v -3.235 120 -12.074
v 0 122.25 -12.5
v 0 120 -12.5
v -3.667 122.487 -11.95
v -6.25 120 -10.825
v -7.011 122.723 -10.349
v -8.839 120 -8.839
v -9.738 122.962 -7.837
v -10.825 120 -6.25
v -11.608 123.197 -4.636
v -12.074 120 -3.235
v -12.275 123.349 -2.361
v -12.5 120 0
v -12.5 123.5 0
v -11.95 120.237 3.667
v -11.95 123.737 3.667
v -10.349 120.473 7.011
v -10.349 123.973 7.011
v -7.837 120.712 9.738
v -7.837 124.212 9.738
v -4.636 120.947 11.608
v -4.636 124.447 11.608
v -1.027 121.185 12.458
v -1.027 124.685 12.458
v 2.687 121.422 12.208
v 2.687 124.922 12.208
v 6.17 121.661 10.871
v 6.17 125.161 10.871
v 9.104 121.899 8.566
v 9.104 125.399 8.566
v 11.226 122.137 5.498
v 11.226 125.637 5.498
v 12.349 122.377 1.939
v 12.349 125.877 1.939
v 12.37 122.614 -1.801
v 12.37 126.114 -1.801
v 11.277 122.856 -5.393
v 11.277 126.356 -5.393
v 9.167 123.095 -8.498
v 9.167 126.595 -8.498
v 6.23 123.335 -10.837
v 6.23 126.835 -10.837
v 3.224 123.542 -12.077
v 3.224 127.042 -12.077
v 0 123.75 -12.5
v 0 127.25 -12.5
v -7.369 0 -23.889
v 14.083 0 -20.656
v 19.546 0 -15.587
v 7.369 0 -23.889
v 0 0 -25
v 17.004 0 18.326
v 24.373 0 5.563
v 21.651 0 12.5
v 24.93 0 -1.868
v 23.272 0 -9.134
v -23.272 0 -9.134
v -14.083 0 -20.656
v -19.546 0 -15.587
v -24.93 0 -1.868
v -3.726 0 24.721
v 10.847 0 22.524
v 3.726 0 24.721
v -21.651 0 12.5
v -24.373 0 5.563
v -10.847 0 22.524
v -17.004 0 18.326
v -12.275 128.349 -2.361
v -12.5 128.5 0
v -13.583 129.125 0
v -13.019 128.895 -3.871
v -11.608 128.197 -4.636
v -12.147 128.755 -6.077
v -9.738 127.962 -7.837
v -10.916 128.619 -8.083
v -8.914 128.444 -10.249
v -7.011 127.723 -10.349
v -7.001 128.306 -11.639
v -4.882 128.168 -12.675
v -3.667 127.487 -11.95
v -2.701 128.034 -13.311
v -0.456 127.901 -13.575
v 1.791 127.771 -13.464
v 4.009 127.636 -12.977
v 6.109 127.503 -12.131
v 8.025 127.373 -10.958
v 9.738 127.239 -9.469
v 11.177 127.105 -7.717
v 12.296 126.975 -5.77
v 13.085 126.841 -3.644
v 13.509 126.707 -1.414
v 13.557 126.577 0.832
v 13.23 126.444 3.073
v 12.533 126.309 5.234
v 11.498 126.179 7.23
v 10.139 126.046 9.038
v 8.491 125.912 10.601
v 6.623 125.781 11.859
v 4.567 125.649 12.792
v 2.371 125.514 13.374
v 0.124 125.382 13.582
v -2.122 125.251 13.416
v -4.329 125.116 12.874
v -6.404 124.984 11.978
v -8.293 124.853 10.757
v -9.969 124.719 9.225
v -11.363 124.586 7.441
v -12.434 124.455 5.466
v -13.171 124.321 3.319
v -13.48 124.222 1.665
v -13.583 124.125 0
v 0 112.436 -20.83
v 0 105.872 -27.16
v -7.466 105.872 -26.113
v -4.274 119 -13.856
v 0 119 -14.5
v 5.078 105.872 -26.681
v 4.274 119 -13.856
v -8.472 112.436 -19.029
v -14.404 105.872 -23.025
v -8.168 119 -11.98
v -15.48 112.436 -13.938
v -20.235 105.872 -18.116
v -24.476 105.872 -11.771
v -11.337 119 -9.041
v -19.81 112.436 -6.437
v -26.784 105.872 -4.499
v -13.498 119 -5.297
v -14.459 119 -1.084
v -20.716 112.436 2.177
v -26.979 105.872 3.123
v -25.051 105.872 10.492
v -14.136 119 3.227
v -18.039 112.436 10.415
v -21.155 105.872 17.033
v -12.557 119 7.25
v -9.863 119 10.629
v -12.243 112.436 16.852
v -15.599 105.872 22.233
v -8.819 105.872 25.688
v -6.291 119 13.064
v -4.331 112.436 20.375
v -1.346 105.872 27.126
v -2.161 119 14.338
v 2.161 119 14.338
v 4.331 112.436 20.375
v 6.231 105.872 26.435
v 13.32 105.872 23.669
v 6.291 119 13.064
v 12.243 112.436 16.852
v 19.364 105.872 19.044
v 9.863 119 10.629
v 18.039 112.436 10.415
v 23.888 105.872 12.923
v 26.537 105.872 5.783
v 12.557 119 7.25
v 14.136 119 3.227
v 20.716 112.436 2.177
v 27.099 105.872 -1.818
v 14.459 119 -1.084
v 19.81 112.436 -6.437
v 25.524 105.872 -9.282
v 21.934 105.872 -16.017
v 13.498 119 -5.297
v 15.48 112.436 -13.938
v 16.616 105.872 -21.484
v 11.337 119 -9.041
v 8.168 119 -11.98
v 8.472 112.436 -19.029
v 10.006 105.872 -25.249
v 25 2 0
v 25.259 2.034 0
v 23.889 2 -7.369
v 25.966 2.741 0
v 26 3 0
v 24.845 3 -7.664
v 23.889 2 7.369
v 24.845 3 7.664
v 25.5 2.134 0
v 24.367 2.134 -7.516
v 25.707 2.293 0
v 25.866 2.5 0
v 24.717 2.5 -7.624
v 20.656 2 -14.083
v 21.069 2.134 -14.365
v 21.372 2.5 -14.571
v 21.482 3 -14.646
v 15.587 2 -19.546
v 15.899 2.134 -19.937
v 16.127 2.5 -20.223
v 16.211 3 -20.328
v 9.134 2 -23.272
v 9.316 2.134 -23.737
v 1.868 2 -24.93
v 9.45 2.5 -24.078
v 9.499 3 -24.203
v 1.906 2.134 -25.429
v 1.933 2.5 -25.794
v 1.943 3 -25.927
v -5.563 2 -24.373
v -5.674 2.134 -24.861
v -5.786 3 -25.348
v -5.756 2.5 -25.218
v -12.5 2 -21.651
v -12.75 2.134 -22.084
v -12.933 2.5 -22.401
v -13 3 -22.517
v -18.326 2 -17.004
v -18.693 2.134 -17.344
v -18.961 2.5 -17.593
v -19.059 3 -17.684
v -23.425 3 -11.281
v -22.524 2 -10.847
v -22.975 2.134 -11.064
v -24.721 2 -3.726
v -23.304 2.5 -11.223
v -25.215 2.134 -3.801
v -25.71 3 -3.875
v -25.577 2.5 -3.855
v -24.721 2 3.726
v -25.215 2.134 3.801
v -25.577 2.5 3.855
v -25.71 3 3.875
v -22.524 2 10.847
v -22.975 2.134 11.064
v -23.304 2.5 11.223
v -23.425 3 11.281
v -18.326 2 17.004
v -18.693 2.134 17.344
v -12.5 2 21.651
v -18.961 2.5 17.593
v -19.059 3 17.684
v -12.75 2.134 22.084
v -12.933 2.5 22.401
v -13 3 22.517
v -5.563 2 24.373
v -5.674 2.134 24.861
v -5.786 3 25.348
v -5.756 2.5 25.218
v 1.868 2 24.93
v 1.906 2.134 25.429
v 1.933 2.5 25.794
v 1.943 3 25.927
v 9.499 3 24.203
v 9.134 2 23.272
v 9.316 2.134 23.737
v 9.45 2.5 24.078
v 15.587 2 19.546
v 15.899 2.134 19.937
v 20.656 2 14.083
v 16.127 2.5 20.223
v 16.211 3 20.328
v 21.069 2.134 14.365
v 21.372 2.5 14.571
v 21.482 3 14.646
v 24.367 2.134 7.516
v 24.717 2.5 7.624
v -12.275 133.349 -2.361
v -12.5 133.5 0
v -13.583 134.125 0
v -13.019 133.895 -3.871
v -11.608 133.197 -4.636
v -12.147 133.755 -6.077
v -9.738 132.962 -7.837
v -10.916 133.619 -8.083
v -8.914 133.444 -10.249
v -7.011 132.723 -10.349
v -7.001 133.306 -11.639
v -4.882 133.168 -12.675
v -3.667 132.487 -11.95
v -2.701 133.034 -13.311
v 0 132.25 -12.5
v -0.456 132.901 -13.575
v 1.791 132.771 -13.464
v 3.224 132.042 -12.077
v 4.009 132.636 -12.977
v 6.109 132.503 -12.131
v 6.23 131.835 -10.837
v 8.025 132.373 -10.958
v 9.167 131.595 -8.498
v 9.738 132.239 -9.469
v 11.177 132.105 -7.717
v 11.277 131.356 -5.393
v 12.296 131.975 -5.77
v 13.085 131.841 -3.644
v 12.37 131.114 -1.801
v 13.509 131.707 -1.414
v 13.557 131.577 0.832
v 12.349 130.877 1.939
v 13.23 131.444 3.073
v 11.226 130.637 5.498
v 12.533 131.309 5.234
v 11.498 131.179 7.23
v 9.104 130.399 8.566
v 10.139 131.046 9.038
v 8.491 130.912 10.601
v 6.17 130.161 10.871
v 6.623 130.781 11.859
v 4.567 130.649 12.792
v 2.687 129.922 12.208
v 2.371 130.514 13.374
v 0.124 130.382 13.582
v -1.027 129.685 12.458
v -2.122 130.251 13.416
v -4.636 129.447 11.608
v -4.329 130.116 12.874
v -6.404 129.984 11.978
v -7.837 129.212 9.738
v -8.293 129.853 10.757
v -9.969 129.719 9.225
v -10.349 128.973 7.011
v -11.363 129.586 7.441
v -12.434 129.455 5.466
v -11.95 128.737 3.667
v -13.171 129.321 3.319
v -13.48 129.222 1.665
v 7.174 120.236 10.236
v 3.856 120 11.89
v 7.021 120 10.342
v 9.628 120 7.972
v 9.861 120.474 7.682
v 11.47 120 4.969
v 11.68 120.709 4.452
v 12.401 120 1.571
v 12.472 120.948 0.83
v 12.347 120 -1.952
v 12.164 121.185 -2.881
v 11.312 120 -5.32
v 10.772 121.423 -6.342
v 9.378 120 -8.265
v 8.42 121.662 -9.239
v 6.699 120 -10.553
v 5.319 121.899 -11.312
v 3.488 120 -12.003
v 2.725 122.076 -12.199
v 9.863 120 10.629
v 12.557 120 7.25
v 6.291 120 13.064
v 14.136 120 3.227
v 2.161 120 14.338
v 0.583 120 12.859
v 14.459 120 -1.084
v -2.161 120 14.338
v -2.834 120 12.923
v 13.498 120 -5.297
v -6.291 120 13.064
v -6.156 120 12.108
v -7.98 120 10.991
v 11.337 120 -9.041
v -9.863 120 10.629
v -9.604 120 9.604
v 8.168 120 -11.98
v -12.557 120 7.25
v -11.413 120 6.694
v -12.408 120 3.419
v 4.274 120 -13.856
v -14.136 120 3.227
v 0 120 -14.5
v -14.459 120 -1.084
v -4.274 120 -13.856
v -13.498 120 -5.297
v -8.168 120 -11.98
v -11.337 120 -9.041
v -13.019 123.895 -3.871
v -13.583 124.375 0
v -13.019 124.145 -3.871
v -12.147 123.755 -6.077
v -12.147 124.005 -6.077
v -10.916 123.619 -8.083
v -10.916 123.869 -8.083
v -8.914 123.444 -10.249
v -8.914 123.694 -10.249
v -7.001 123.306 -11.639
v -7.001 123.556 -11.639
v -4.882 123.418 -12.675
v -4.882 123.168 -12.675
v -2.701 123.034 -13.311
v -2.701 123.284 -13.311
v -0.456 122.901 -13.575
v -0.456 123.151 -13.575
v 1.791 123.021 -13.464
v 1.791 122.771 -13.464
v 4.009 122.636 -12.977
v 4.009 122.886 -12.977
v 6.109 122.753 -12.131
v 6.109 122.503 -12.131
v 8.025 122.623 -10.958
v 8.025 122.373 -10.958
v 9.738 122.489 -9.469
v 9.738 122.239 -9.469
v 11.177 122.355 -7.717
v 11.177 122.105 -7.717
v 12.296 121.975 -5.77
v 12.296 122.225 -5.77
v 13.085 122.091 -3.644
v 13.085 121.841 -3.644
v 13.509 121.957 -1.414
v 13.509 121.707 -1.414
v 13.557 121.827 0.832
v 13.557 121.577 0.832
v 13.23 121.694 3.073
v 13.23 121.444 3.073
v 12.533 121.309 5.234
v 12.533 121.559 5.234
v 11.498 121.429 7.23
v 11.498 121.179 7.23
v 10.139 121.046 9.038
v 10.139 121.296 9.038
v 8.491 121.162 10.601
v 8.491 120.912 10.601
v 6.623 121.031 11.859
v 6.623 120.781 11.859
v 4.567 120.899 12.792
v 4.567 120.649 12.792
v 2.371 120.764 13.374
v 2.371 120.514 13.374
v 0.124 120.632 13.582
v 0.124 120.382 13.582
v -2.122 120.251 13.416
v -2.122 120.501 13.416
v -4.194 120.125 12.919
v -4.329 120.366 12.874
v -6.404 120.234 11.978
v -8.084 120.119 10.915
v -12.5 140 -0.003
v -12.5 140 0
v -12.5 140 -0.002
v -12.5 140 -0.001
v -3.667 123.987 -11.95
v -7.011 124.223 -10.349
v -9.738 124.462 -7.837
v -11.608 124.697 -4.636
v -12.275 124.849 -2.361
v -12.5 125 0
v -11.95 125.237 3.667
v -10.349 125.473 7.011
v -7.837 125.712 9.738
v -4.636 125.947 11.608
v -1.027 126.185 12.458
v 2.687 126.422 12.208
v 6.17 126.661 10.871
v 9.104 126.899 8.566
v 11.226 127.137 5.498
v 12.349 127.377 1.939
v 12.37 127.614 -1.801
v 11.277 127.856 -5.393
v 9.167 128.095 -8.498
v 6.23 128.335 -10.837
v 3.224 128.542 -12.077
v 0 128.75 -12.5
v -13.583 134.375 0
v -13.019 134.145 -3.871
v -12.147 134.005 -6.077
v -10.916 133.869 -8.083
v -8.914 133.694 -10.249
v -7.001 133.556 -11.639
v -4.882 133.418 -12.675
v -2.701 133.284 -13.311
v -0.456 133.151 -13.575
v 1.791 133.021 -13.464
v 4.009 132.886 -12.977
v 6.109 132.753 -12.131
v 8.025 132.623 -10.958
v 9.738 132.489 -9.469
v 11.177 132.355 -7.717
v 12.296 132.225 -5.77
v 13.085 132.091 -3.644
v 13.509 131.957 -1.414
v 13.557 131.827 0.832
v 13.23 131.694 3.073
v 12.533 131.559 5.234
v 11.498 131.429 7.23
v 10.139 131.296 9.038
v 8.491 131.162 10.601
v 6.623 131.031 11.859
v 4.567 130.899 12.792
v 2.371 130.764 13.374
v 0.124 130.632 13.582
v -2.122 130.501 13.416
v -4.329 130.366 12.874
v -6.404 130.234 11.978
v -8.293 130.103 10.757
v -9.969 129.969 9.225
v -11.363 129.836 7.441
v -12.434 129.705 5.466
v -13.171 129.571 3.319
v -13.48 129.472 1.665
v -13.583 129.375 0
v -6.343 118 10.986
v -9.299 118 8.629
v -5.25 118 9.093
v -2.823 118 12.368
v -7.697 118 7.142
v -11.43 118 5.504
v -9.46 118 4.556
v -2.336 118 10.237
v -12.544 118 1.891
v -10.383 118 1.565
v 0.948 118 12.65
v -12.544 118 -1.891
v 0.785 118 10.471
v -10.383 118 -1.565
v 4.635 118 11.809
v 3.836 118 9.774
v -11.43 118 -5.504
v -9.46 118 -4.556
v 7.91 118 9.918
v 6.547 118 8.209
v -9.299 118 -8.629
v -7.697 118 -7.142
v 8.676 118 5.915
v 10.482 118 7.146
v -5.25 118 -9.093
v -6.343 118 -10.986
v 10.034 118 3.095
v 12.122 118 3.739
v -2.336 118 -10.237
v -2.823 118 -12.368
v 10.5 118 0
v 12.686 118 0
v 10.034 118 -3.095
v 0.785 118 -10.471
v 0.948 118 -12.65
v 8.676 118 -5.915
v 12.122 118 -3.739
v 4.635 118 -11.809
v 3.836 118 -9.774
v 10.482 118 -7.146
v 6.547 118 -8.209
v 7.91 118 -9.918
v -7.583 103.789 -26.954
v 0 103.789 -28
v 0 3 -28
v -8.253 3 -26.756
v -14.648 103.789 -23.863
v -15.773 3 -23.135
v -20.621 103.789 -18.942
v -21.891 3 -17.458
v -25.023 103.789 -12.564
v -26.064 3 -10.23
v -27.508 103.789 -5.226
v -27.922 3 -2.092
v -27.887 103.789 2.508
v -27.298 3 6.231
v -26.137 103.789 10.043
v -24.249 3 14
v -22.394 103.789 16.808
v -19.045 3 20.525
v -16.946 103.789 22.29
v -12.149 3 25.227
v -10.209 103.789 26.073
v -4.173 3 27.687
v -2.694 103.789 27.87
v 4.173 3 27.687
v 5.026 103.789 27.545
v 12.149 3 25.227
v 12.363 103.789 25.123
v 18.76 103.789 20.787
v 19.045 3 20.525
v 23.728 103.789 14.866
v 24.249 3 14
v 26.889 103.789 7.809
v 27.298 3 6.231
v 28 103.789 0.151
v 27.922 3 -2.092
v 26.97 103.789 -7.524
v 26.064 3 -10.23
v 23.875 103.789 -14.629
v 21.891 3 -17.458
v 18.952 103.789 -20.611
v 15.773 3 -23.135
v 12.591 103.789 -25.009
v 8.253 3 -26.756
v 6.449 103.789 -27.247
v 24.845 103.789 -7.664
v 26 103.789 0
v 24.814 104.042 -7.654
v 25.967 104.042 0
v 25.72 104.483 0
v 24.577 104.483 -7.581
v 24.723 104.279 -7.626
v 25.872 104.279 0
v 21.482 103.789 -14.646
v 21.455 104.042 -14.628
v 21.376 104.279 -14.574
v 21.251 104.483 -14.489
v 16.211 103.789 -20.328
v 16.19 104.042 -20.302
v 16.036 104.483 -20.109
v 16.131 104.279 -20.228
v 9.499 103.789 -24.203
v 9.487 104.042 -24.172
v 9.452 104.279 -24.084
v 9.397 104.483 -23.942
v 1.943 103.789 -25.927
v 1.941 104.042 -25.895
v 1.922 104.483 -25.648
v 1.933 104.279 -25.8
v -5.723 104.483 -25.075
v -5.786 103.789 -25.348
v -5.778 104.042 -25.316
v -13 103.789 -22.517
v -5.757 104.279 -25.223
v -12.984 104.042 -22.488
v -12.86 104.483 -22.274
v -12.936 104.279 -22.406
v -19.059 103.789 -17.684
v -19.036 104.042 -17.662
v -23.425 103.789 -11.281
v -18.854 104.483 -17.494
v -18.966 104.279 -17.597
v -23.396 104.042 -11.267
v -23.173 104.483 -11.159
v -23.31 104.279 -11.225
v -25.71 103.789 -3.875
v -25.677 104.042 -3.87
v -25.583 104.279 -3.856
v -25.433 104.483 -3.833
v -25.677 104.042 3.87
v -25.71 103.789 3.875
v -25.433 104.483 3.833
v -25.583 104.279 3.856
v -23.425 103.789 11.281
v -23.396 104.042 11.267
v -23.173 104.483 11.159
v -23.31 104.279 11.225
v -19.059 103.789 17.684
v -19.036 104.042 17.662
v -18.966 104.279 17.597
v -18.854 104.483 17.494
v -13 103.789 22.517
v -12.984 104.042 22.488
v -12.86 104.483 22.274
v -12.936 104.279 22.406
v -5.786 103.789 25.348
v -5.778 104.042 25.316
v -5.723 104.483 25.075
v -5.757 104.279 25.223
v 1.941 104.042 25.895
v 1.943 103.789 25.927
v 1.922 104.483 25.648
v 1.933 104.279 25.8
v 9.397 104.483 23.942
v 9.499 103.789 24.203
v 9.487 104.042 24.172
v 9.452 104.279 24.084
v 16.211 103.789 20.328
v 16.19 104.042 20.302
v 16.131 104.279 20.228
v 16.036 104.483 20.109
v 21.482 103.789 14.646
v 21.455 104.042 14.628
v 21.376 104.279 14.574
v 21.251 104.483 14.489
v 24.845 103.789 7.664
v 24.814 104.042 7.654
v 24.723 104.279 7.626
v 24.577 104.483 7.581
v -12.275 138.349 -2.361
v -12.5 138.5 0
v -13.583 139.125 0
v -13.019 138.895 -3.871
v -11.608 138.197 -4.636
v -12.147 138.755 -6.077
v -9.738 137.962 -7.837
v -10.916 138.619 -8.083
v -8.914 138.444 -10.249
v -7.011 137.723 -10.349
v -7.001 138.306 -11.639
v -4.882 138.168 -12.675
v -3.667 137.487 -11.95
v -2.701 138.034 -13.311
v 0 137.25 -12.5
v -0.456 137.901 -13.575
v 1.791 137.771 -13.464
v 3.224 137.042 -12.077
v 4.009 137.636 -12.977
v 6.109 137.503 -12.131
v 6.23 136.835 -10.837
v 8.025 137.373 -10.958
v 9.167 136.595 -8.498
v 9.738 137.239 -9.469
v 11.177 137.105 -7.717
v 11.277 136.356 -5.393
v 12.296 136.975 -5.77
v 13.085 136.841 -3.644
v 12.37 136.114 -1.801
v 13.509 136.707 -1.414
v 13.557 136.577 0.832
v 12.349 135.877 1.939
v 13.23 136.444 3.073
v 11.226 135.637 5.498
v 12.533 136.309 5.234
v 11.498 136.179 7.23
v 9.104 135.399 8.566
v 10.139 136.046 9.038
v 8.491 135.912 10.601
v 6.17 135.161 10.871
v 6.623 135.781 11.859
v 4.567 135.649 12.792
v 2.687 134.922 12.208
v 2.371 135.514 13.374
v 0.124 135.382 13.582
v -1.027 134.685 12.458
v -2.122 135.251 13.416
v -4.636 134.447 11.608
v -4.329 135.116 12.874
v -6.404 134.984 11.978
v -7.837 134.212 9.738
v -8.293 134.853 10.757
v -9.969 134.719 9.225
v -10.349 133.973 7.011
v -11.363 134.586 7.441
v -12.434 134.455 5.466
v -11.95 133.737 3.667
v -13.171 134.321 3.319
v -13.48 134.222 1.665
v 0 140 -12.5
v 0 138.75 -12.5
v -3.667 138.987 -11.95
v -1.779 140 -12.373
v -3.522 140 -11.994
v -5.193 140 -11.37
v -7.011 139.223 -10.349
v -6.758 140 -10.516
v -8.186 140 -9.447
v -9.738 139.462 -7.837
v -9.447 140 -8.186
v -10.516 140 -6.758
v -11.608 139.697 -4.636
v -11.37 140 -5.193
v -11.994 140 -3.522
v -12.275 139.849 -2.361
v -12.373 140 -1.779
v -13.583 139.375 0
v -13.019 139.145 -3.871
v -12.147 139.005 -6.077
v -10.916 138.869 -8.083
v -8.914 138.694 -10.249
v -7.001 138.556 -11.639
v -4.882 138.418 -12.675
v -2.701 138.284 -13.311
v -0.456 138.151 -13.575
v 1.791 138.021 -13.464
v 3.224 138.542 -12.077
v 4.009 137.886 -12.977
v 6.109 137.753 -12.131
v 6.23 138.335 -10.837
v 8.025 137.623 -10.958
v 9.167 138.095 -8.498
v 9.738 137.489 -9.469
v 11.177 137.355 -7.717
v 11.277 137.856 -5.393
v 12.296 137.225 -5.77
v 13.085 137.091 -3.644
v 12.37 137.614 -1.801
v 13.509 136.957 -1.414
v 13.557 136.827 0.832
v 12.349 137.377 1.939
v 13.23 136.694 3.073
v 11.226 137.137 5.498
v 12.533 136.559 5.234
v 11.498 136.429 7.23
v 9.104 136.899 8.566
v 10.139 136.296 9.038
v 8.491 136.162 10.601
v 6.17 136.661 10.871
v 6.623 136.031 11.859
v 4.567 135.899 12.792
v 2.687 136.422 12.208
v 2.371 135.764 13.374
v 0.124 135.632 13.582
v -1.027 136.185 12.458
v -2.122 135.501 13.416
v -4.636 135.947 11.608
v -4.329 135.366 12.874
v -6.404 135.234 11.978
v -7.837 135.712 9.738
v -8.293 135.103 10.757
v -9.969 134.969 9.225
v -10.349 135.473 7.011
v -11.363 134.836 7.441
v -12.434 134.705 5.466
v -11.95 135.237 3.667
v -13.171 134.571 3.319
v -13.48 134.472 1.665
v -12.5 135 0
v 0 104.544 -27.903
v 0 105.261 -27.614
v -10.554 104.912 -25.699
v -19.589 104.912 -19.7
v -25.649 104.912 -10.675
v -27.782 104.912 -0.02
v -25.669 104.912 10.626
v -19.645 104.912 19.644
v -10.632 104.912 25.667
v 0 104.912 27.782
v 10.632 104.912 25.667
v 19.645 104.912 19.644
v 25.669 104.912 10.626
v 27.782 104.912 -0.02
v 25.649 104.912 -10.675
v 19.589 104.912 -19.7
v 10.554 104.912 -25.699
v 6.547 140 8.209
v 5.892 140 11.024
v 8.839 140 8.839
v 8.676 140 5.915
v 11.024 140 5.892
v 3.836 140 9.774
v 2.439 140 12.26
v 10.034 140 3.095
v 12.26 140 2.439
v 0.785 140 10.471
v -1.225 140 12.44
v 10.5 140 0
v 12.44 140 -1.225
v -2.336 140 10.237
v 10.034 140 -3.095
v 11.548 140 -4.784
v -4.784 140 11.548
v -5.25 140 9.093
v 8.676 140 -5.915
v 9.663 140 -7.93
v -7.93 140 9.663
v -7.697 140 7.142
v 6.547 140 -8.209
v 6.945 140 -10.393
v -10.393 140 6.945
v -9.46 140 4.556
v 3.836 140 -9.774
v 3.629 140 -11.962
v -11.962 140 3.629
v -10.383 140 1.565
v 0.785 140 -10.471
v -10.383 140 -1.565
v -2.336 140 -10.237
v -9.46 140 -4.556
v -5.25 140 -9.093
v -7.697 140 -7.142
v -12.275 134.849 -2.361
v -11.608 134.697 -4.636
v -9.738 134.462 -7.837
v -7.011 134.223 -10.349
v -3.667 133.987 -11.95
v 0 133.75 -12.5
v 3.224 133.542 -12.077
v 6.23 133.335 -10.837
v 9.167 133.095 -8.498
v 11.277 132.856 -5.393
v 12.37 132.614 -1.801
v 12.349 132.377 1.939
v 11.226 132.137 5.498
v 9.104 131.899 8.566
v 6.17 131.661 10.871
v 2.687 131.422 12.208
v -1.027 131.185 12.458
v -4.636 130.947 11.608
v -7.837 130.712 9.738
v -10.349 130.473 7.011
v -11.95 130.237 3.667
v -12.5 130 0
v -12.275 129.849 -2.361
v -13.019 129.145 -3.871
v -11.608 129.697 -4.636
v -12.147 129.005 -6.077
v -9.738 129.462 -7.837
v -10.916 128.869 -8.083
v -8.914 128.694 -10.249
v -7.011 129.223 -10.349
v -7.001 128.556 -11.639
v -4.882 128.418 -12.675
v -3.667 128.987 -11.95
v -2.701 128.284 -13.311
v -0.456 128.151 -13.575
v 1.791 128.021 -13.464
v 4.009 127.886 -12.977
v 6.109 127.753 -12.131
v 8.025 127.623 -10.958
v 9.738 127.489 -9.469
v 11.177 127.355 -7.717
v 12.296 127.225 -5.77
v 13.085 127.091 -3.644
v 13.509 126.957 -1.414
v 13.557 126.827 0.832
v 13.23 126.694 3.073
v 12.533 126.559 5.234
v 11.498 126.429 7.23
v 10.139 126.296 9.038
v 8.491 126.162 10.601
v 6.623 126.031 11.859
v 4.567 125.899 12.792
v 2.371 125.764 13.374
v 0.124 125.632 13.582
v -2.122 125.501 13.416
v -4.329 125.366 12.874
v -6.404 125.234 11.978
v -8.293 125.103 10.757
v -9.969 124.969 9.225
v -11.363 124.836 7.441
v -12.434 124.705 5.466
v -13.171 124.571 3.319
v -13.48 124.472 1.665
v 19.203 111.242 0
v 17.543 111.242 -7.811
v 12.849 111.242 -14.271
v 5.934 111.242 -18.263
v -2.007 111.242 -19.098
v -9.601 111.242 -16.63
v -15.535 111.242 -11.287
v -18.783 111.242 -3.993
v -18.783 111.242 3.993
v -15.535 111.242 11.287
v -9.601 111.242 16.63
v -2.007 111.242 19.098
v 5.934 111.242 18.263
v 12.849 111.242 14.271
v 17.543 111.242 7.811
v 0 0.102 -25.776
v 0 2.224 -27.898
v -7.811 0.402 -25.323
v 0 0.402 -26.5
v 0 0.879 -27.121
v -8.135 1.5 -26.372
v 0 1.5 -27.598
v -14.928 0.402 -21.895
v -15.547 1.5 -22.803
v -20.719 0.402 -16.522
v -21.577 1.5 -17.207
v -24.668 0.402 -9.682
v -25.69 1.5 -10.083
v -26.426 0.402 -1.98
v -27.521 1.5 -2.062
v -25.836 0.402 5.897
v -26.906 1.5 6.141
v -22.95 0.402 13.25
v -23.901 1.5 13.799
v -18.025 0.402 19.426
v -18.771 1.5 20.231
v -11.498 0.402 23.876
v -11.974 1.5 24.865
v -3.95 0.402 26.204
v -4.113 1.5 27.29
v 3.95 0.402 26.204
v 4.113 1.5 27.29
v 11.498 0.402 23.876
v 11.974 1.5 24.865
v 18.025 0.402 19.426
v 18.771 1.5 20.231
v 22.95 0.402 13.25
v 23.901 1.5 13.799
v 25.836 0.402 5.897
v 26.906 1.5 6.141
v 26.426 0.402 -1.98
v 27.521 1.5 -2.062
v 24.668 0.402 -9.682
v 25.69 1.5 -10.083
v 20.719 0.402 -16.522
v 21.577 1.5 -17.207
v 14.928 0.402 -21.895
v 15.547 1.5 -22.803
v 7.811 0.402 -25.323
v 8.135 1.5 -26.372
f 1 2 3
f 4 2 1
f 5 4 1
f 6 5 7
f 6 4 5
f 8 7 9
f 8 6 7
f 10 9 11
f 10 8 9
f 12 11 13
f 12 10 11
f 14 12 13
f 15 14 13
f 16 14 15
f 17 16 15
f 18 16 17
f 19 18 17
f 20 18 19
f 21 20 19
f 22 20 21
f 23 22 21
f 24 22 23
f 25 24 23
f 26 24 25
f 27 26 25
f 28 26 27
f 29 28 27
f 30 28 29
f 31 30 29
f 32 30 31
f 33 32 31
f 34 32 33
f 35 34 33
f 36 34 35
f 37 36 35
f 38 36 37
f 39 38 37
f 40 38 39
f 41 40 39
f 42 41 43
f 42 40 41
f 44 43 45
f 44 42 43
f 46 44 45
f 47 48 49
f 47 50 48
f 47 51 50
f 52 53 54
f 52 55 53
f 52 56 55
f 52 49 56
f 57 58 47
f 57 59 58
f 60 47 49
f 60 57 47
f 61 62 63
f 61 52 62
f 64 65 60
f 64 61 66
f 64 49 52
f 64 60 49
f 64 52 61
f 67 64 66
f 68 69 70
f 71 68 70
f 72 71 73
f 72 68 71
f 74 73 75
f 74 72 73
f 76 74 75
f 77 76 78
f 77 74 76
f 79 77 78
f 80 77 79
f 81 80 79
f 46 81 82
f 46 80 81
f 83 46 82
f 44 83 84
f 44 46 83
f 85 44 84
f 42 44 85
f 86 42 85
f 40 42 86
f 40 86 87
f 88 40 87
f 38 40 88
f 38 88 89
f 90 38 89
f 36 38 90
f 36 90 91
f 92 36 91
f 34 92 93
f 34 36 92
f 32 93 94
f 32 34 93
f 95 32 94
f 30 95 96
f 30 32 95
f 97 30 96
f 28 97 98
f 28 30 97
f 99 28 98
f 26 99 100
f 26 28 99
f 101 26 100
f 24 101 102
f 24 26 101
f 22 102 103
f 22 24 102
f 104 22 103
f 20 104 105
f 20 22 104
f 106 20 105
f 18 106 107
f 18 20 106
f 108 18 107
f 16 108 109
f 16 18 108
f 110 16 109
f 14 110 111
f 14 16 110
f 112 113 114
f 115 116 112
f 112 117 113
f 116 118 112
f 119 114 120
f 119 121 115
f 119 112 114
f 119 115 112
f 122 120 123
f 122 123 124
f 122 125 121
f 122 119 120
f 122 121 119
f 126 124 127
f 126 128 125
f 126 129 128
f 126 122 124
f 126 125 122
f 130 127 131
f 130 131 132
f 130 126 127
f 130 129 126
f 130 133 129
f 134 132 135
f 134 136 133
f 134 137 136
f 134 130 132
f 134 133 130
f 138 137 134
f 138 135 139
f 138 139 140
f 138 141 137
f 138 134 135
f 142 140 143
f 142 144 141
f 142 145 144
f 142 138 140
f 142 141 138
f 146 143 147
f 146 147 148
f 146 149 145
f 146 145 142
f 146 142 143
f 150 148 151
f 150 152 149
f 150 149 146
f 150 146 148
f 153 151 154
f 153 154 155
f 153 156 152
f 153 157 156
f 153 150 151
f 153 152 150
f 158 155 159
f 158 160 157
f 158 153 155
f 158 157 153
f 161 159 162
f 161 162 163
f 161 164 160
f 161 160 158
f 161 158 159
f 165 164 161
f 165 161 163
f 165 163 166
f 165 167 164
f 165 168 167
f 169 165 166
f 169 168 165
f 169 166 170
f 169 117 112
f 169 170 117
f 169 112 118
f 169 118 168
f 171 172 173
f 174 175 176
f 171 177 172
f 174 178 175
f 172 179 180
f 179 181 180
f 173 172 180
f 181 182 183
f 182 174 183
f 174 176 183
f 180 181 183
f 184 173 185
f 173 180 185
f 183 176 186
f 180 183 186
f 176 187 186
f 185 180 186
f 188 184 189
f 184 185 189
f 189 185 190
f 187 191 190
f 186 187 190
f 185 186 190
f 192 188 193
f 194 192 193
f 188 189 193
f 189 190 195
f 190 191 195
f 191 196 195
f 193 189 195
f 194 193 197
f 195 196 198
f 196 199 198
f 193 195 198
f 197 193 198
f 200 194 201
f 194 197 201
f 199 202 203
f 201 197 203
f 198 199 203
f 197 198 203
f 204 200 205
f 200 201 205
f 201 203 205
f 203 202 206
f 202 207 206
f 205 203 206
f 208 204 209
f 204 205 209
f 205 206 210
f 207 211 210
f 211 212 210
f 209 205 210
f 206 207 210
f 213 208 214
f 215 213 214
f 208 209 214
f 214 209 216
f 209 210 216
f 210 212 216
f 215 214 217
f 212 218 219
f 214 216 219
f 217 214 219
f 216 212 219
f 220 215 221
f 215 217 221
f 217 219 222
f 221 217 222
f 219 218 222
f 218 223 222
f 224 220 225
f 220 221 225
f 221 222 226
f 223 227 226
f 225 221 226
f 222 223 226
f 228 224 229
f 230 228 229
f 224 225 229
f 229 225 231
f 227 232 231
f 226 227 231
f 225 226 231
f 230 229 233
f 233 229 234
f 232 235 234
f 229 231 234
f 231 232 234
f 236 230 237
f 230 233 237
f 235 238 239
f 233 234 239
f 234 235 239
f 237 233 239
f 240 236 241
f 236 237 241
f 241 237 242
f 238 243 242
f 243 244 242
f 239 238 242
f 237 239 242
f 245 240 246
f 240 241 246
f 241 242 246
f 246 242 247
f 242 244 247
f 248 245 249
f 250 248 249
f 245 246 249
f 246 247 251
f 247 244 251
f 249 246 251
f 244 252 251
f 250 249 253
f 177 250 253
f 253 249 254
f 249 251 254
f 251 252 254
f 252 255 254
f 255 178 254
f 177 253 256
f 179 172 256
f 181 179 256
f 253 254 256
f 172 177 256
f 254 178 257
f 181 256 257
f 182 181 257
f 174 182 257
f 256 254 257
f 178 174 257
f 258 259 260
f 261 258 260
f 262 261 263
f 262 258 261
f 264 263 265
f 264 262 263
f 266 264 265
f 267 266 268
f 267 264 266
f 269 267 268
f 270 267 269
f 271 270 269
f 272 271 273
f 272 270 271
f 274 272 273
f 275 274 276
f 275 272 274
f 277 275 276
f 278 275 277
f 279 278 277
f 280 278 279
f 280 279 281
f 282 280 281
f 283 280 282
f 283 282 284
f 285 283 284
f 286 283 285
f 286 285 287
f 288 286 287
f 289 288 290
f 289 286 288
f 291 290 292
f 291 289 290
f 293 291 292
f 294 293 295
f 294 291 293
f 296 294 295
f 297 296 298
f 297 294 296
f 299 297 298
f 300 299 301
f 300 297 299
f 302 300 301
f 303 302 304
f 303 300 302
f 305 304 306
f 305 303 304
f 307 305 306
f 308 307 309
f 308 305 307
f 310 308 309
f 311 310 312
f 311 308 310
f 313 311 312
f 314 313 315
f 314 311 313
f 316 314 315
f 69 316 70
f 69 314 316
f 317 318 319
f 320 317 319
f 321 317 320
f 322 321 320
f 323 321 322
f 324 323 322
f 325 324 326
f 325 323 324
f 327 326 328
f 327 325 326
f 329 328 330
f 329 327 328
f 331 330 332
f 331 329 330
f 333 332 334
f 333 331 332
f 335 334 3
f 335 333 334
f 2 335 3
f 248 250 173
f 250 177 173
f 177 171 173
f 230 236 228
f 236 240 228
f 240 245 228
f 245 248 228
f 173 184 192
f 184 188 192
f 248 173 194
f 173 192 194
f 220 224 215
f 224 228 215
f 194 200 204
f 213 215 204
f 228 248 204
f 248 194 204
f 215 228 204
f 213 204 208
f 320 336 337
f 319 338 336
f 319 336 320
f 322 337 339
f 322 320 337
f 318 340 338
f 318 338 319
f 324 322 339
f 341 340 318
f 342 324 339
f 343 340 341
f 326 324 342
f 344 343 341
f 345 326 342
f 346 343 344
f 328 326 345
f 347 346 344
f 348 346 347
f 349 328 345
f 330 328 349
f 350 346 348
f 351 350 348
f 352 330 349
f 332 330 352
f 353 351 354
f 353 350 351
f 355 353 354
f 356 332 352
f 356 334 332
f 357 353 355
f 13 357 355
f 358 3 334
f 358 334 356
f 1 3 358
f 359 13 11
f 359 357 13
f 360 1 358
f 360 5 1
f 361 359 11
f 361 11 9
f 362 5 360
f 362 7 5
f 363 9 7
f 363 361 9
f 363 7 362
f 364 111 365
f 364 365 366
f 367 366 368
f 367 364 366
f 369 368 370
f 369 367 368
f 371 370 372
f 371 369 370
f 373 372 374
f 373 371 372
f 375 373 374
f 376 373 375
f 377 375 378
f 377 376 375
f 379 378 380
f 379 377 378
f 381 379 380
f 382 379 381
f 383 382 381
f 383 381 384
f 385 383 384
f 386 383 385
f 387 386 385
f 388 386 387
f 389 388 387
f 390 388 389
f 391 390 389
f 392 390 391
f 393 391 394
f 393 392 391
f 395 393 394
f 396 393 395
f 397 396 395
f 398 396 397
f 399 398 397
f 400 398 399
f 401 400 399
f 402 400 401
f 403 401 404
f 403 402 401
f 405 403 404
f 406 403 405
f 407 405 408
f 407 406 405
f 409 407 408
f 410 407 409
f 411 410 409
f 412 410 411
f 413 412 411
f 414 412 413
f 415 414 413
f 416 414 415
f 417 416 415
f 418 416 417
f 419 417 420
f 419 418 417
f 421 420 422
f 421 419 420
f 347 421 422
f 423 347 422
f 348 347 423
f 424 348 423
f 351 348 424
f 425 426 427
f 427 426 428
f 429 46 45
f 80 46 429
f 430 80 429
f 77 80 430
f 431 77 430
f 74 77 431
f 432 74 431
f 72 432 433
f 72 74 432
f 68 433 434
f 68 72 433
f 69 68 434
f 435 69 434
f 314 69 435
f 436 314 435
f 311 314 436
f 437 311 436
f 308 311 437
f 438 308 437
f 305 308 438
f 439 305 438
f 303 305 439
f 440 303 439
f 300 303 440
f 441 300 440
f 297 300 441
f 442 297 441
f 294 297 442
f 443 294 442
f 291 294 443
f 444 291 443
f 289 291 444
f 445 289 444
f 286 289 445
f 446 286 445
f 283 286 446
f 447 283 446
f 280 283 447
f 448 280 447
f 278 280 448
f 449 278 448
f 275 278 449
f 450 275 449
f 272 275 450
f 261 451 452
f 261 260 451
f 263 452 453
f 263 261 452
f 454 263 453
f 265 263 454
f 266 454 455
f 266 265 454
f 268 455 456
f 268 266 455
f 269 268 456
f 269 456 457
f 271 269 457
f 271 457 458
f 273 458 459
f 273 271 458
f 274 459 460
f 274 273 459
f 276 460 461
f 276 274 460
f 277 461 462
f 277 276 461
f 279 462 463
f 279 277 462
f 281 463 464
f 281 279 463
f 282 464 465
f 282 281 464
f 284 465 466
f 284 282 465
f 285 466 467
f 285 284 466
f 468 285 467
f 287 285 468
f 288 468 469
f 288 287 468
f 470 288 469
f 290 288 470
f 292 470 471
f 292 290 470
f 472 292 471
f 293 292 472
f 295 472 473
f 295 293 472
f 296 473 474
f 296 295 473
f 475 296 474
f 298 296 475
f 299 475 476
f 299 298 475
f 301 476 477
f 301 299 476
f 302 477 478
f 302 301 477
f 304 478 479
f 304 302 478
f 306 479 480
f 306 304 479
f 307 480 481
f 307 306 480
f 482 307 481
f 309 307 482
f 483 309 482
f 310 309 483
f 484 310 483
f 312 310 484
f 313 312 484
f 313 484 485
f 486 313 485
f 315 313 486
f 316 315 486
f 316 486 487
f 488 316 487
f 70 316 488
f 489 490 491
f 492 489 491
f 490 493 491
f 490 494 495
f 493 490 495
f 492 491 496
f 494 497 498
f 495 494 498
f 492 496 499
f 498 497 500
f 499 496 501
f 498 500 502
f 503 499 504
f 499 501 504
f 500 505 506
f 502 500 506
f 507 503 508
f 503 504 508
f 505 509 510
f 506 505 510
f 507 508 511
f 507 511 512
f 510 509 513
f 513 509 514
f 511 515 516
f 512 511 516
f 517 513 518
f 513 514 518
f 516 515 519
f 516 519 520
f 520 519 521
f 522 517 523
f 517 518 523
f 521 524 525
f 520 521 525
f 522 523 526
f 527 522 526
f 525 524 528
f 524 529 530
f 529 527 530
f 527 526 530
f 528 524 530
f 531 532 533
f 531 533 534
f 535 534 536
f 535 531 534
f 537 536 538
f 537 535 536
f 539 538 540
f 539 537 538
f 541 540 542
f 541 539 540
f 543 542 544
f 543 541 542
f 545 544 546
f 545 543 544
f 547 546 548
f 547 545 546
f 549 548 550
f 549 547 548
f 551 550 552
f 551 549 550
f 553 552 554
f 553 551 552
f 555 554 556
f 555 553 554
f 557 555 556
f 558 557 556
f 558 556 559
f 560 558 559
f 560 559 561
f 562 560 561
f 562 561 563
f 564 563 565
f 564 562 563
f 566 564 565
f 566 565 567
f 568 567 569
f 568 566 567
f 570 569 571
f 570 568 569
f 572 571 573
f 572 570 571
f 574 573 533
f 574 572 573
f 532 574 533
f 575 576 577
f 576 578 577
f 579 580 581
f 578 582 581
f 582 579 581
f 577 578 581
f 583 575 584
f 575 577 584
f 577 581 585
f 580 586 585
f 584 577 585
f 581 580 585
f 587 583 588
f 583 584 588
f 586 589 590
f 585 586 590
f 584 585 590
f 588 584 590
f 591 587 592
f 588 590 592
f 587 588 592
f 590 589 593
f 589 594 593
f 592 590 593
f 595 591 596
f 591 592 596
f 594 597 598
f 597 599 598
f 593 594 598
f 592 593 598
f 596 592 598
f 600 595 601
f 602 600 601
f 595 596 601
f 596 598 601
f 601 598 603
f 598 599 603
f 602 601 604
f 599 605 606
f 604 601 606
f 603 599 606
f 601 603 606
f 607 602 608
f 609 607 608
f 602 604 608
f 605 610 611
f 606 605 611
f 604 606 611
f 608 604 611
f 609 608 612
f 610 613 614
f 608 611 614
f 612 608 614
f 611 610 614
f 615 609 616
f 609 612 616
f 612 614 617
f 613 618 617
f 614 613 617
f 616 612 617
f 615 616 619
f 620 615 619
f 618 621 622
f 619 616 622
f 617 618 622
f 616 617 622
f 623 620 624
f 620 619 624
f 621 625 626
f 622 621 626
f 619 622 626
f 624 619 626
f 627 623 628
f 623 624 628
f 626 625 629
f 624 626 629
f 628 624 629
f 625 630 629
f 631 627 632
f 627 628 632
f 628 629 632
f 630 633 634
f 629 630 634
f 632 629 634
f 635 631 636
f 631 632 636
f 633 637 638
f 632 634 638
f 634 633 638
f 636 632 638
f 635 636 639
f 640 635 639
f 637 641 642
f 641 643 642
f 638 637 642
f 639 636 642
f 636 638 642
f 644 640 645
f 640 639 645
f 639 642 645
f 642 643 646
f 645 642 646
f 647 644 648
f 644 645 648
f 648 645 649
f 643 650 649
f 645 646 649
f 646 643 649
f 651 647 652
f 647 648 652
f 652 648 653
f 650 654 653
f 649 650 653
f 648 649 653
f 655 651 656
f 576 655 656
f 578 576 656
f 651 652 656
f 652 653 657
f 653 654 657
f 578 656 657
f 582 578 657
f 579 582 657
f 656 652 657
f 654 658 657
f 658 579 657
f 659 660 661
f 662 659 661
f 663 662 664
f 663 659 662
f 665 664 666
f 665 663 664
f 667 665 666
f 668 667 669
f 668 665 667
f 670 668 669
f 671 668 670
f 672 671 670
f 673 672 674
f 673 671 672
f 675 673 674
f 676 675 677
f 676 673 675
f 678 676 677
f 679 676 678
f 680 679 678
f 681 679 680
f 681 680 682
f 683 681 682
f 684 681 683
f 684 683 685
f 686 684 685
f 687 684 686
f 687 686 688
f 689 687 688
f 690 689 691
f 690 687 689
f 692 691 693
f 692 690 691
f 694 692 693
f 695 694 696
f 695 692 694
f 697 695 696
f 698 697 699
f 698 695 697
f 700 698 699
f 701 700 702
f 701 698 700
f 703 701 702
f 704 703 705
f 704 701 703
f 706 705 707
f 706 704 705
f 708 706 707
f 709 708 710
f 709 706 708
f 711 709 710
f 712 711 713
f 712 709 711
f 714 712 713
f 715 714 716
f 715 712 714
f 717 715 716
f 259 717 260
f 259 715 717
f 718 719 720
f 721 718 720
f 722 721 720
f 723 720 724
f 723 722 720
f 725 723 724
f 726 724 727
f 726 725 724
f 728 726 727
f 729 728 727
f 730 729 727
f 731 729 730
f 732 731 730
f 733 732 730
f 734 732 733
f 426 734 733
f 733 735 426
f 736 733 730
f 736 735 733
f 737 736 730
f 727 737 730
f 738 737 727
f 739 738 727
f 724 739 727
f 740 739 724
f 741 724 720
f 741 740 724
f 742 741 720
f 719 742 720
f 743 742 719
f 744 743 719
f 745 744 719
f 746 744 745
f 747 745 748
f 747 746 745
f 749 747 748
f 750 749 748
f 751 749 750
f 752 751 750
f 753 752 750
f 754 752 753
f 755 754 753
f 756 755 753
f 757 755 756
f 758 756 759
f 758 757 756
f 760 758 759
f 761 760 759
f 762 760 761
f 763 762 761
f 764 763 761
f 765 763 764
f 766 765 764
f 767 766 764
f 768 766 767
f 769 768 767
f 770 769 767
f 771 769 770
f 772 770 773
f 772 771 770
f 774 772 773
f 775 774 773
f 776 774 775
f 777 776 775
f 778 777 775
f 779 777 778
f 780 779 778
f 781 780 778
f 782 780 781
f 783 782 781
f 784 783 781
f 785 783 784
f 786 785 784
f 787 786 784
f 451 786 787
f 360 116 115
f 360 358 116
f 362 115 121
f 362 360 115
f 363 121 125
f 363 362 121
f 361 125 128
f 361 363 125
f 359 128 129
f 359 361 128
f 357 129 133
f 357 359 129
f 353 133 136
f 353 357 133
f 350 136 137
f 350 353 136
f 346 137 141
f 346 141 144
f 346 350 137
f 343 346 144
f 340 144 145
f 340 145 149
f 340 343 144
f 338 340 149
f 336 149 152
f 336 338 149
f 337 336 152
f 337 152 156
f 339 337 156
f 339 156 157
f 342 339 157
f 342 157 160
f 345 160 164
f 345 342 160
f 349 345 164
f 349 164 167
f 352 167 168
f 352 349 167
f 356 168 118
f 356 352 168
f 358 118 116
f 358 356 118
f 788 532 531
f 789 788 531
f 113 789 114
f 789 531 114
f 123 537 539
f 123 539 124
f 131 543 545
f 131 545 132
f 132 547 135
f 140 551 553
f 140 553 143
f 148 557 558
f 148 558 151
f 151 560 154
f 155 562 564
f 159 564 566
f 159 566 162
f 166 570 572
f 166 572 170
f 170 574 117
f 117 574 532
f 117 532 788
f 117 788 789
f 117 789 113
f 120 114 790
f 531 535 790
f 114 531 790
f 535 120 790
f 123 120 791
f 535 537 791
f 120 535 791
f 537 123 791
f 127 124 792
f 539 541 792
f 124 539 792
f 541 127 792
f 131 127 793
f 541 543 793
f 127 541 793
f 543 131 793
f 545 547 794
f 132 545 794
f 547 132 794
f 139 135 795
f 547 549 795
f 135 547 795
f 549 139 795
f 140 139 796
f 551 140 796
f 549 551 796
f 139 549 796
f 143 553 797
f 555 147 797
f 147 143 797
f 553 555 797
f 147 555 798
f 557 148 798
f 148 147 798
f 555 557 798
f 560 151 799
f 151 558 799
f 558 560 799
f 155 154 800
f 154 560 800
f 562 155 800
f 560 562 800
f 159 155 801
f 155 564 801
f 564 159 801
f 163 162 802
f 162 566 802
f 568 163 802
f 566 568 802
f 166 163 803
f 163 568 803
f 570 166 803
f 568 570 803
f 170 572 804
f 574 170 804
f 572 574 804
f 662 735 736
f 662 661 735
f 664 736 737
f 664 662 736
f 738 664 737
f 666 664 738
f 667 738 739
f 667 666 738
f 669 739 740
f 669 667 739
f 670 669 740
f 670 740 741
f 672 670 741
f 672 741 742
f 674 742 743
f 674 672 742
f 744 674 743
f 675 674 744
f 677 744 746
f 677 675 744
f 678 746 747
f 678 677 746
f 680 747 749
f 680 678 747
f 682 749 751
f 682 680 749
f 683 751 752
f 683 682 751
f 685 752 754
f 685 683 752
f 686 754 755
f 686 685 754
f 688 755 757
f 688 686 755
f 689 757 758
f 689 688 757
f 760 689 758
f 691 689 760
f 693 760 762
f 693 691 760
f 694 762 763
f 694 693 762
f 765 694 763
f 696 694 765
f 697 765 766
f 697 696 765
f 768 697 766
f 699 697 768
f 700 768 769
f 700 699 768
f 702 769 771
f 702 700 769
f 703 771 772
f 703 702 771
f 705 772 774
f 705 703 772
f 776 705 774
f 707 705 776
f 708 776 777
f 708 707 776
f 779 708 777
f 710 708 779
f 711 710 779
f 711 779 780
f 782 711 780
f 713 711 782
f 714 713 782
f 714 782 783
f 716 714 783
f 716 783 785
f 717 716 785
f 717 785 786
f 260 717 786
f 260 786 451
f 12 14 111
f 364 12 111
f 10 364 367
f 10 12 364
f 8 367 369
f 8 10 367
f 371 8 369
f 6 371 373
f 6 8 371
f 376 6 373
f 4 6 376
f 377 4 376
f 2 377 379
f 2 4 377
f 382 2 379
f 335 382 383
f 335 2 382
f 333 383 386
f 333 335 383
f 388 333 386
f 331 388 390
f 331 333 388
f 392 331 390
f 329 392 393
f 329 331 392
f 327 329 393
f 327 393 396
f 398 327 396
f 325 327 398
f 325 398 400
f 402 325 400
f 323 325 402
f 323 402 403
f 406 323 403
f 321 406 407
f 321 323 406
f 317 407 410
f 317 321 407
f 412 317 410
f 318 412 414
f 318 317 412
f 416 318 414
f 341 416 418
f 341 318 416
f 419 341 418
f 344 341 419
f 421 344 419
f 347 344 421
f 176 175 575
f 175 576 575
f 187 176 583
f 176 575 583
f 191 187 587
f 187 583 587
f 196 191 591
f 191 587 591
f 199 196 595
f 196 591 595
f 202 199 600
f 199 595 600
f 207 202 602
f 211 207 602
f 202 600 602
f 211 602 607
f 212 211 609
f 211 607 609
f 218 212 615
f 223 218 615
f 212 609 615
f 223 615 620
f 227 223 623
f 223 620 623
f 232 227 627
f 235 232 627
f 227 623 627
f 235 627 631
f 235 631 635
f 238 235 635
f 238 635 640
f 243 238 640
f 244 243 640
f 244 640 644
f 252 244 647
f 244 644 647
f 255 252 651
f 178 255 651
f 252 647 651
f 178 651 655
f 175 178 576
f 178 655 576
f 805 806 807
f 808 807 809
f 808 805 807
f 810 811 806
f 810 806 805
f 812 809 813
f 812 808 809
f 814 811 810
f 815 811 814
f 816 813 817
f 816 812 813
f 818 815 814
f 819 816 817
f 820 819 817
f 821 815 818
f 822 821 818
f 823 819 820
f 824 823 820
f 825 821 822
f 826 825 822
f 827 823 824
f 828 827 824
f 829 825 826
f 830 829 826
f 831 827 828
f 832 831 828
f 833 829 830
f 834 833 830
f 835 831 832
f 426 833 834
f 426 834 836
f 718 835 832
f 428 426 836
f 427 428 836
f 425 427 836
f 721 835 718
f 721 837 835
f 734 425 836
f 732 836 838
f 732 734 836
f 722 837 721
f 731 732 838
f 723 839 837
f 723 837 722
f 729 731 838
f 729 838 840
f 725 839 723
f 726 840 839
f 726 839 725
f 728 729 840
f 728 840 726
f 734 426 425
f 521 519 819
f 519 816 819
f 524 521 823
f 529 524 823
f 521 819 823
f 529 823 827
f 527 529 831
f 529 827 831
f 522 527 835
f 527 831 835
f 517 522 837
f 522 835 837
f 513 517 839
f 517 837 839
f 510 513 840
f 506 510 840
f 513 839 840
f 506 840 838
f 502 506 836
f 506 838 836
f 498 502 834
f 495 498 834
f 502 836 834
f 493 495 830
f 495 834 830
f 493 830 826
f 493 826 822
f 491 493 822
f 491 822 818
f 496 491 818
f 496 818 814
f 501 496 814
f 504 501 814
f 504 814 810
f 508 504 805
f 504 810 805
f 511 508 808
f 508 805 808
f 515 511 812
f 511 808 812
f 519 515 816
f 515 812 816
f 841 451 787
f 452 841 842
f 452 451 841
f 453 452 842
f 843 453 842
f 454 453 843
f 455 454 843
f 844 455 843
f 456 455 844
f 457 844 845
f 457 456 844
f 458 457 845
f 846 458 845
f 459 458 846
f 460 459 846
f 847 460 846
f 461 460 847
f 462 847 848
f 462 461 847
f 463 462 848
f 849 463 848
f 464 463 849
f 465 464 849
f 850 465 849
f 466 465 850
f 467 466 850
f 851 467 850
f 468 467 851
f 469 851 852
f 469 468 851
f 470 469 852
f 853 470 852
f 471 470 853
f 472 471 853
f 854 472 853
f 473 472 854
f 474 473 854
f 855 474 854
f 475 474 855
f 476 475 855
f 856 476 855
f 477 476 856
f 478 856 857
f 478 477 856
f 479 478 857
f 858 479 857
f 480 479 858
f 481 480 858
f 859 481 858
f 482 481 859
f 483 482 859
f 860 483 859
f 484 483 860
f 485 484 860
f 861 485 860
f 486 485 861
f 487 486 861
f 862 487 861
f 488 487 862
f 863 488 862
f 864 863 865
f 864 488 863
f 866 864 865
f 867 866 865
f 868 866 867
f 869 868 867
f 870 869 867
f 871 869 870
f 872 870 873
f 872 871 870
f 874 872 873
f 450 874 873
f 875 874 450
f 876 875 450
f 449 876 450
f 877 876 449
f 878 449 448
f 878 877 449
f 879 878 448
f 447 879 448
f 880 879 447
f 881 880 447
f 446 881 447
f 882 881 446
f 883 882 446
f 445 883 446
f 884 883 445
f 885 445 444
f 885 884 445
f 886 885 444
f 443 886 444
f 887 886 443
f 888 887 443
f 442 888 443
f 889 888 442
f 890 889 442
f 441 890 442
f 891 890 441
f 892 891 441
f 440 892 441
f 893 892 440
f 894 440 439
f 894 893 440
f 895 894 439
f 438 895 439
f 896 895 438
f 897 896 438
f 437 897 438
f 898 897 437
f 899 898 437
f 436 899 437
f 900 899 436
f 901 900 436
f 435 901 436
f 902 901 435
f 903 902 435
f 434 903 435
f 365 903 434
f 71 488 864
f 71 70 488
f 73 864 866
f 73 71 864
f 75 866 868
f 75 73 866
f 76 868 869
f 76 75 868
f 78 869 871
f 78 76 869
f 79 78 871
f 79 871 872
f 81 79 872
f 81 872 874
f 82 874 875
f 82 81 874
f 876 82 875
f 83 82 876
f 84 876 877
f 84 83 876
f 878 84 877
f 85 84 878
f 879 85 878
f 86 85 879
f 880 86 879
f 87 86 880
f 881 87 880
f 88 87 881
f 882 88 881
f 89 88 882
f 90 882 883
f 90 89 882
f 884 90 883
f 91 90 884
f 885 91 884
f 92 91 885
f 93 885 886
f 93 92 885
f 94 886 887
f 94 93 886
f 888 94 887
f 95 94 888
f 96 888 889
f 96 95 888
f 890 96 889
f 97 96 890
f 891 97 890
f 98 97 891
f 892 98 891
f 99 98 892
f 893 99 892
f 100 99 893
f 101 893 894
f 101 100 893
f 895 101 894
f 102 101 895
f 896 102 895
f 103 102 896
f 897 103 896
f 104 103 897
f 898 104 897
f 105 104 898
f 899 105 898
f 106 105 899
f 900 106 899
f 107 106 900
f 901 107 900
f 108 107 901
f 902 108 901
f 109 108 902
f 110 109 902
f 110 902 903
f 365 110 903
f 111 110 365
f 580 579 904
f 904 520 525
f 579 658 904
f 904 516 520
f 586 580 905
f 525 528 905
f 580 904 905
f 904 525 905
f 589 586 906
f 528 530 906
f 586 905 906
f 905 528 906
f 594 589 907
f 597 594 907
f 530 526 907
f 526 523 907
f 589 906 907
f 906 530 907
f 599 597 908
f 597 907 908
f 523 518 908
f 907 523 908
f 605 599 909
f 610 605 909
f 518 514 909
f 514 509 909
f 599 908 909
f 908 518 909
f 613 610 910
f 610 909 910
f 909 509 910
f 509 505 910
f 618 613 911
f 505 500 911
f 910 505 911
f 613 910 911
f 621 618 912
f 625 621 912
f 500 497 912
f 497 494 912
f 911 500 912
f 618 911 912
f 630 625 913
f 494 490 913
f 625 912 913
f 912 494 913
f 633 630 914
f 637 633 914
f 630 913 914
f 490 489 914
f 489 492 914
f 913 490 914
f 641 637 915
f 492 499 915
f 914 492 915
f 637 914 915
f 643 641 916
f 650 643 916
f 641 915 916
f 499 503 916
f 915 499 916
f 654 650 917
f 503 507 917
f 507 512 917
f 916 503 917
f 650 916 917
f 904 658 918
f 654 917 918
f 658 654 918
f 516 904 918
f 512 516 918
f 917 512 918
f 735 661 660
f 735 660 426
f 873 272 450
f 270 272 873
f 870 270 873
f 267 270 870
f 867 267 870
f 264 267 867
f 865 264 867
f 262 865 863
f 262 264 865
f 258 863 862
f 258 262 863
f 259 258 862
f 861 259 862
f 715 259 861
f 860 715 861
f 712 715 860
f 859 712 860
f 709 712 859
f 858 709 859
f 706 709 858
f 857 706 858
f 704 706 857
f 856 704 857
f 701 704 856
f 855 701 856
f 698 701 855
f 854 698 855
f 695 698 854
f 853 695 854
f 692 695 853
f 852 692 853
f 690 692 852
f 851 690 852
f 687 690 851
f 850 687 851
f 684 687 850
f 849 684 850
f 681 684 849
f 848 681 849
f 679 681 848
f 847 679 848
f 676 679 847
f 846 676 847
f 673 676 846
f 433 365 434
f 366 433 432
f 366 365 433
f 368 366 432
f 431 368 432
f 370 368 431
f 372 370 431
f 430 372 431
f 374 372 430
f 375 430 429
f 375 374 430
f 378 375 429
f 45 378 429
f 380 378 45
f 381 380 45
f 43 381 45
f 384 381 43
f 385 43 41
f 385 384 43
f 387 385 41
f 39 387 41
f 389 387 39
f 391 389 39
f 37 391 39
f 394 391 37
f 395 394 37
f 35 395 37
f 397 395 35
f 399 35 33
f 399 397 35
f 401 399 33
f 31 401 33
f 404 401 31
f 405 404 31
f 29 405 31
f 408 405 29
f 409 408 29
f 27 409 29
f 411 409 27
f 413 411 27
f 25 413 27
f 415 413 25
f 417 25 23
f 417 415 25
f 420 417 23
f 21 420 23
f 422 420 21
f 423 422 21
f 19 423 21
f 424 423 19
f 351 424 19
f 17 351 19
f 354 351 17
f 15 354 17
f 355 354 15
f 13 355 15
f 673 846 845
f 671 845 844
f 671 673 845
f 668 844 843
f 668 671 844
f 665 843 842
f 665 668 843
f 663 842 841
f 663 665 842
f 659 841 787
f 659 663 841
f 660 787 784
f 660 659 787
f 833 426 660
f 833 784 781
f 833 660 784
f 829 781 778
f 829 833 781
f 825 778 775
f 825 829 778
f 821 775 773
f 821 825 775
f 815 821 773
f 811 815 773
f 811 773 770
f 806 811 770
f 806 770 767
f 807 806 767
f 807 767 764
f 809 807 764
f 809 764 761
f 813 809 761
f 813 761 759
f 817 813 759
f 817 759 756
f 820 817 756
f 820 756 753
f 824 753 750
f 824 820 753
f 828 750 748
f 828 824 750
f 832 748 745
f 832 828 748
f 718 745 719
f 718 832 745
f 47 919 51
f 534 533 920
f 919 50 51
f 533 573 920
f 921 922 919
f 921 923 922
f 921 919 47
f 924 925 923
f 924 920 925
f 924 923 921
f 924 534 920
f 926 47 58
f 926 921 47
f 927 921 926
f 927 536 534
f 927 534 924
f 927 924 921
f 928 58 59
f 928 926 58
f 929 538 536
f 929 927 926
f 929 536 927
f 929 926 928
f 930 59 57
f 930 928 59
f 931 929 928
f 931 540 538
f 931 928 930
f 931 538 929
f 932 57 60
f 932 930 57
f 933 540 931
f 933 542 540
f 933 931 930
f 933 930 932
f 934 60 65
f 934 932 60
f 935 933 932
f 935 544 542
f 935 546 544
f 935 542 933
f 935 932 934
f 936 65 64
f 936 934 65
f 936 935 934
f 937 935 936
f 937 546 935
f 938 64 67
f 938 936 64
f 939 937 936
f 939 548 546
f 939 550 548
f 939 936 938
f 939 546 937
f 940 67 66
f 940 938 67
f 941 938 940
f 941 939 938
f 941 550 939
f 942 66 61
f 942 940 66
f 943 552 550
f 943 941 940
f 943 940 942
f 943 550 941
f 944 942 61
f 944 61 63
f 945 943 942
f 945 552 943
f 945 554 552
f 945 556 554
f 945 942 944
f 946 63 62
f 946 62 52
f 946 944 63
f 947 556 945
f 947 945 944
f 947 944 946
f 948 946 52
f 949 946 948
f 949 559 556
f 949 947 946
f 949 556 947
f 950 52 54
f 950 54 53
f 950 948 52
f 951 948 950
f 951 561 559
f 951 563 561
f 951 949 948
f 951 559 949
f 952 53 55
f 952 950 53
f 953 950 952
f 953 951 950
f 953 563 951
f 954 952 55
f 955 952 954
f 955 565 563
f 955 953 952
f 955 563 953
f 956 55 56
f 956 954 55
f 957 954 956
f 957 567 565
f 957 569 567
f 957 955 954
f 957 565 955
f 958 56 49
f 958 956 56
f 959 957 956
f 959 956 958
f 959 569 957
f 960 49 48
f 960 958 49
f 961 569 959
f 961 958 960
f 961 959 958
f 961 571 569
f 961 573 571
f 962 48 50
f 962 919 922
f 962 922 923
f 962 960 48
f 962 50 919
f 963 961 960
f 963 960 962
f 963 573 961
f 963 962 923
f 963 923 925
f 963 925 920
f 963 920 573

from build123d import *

# Parameters (mm, degrees)
RADYUS1_R  = 3
DI_1_PITCH = 5


# Read off the part's stored shape, not the designer's step: İç Boşaltma1
with BuildPart() as part:
    # Çizim1 → Döndür1 (revolve)
    with BuildSketch(Plane.XY, mode=Mode.PRIVATE) as d_nd_r1_sk:
        Polygon((0, 0), (-28, 0), (-28, 105), (-14.5, 119), (-14.5, 120), (-12.5, 120), (-12.5, 140), (0, 140), align=None)
    revolve(d_nd_r1_sk.sketch.rotate(Axis((0, 0, 0), (0, 1, 0)), 270), axis=Axis((0, 0, 0), (0, 1, 0)))

    # Radyus1
    radyus1_edges = [part.edges().sort_by_distance(p)[0] for p in [
        (0, 105, 28),
        (0, 0, 28),
    ]]
    fillet(radyus1_edges, radius=RADYUS1_R)

    # İç Boşaltma1 outline → İç Boşaltma1 (revolve, cut)
    with BuildSketch(Plane.XY):
        with BuildLine():
            Line((0, 140), (0, 2))
            Line((0, 2), (25, 2))
            ThreePointArc((25, 2), (25.707106781, 2.292893219), (26, 3))
            Line((26, 3), (26, 103.789188814))
            ThreePointArc((26, 103.789188814), (25.927319873, 104.163458572), (25.719844295, 104.483324384))
            Line((25.719844295, 104.483324384), (12.685907094, 118))
            Line((12.685907094, 118), (10.5, 118))
            Line((10.5, 118), (10.5, 140))
            Line((10.5, 140), (0, 140))
        make_face()
    revolve(axis=Axis((0, 0, 0), (0, 1, 0)), mode=Mode.SUBTRACT)

    # Diş1: the profile of Diş Profili1 profile screwed along a right-hand helix of 4 turns, 12 arcs to a turn; built about Z, then put on its axis
    di_1_z = Axis((0, 0, 0), (0, 0, 1))
    di_1_corners = [(12.4997, 0, -0.000173205), (13.58253175, 0, 0.624999997), (13.58253175, 0, 0.874999997), (12.4997, 0, 1.5001732)]
    with BuildLine(mode=Mode.PRIVATE) as di_1_profile:
        Line(di_1_corners[0], di_1_corners[1])
        Line(di_1_corners[1], di_1_corners[2])
        Line(di_1_corners[2], di_1_corners[3])
        Line(di_1_corners[3], di_1_corners[0])
    di_1_cap = Face(di_1_profile.wire())
    di_1_turn_angles = [0, 15, 30, 45, 60, 75, 90, 105, 120, 135, 150, 165, 180, 195, 210, 225, 240, 255, 270, 285, 300, 315, 330, 345, 360]
    di_1_turn_weights = [1, 0.9659258262890683, 1, 0.9659258262890683, 1, 0.9659258262890683, 1, 0.9659258262890683, 1, 0.9659258262890683, 1, 0.9659258262890683, 1, 0.9659258262890683, 1, 0.9659258262890683, 1, 0.9659258262890683, 1, 0.9659258262890683, 1, 0.9659258262890683, 1, 0.9659258262890683, 1]
    di_1_turn_rails = [Edge.make_bspline([Vector(p[0], p[1], 0).rotate(di_1_z, di_1_turn_angles[k]) / di_1_turn_weights[k] + Vector(0, 0, p[2] + DI_1_PITCH * di_1_turn_angles[k] / 360) for k in range(25)], [0, 0, 0, 1, 1, 2, 2, 3, 3, 4, 4, 5, 5, 6, 6, 7, 7, 8, 8, 9, 9, 10, 10, 11, 11, 12, 12, 12], 2, di_1_turn_weights) for p in di_1_corners]
    di_1_turn_sides = [Face.make_surface_from_curves(di_1_turn_rails[p[0]], di_1_turn_rails[p[1]]) for p in [(0, 1), (1, 2), (2, 3), (3, 0)]]
    di_1 = Plane(origin=(0, 140, 0), x_dir=(-1, 0, 0), z_dir=(0, -1, 0)) * Solid(Shell([*[p.moved(Location((0, 0, DI_1_PITCH * i))) for i in range(4) for p in di_1_turn_sides], di_1_cap, di_1_cap.rotate(di_1_z, 1440).moved(Location((0, 0, DI_1_PITCH * 1440 / 360)))]))
    add(di_1)


solid = part.part
